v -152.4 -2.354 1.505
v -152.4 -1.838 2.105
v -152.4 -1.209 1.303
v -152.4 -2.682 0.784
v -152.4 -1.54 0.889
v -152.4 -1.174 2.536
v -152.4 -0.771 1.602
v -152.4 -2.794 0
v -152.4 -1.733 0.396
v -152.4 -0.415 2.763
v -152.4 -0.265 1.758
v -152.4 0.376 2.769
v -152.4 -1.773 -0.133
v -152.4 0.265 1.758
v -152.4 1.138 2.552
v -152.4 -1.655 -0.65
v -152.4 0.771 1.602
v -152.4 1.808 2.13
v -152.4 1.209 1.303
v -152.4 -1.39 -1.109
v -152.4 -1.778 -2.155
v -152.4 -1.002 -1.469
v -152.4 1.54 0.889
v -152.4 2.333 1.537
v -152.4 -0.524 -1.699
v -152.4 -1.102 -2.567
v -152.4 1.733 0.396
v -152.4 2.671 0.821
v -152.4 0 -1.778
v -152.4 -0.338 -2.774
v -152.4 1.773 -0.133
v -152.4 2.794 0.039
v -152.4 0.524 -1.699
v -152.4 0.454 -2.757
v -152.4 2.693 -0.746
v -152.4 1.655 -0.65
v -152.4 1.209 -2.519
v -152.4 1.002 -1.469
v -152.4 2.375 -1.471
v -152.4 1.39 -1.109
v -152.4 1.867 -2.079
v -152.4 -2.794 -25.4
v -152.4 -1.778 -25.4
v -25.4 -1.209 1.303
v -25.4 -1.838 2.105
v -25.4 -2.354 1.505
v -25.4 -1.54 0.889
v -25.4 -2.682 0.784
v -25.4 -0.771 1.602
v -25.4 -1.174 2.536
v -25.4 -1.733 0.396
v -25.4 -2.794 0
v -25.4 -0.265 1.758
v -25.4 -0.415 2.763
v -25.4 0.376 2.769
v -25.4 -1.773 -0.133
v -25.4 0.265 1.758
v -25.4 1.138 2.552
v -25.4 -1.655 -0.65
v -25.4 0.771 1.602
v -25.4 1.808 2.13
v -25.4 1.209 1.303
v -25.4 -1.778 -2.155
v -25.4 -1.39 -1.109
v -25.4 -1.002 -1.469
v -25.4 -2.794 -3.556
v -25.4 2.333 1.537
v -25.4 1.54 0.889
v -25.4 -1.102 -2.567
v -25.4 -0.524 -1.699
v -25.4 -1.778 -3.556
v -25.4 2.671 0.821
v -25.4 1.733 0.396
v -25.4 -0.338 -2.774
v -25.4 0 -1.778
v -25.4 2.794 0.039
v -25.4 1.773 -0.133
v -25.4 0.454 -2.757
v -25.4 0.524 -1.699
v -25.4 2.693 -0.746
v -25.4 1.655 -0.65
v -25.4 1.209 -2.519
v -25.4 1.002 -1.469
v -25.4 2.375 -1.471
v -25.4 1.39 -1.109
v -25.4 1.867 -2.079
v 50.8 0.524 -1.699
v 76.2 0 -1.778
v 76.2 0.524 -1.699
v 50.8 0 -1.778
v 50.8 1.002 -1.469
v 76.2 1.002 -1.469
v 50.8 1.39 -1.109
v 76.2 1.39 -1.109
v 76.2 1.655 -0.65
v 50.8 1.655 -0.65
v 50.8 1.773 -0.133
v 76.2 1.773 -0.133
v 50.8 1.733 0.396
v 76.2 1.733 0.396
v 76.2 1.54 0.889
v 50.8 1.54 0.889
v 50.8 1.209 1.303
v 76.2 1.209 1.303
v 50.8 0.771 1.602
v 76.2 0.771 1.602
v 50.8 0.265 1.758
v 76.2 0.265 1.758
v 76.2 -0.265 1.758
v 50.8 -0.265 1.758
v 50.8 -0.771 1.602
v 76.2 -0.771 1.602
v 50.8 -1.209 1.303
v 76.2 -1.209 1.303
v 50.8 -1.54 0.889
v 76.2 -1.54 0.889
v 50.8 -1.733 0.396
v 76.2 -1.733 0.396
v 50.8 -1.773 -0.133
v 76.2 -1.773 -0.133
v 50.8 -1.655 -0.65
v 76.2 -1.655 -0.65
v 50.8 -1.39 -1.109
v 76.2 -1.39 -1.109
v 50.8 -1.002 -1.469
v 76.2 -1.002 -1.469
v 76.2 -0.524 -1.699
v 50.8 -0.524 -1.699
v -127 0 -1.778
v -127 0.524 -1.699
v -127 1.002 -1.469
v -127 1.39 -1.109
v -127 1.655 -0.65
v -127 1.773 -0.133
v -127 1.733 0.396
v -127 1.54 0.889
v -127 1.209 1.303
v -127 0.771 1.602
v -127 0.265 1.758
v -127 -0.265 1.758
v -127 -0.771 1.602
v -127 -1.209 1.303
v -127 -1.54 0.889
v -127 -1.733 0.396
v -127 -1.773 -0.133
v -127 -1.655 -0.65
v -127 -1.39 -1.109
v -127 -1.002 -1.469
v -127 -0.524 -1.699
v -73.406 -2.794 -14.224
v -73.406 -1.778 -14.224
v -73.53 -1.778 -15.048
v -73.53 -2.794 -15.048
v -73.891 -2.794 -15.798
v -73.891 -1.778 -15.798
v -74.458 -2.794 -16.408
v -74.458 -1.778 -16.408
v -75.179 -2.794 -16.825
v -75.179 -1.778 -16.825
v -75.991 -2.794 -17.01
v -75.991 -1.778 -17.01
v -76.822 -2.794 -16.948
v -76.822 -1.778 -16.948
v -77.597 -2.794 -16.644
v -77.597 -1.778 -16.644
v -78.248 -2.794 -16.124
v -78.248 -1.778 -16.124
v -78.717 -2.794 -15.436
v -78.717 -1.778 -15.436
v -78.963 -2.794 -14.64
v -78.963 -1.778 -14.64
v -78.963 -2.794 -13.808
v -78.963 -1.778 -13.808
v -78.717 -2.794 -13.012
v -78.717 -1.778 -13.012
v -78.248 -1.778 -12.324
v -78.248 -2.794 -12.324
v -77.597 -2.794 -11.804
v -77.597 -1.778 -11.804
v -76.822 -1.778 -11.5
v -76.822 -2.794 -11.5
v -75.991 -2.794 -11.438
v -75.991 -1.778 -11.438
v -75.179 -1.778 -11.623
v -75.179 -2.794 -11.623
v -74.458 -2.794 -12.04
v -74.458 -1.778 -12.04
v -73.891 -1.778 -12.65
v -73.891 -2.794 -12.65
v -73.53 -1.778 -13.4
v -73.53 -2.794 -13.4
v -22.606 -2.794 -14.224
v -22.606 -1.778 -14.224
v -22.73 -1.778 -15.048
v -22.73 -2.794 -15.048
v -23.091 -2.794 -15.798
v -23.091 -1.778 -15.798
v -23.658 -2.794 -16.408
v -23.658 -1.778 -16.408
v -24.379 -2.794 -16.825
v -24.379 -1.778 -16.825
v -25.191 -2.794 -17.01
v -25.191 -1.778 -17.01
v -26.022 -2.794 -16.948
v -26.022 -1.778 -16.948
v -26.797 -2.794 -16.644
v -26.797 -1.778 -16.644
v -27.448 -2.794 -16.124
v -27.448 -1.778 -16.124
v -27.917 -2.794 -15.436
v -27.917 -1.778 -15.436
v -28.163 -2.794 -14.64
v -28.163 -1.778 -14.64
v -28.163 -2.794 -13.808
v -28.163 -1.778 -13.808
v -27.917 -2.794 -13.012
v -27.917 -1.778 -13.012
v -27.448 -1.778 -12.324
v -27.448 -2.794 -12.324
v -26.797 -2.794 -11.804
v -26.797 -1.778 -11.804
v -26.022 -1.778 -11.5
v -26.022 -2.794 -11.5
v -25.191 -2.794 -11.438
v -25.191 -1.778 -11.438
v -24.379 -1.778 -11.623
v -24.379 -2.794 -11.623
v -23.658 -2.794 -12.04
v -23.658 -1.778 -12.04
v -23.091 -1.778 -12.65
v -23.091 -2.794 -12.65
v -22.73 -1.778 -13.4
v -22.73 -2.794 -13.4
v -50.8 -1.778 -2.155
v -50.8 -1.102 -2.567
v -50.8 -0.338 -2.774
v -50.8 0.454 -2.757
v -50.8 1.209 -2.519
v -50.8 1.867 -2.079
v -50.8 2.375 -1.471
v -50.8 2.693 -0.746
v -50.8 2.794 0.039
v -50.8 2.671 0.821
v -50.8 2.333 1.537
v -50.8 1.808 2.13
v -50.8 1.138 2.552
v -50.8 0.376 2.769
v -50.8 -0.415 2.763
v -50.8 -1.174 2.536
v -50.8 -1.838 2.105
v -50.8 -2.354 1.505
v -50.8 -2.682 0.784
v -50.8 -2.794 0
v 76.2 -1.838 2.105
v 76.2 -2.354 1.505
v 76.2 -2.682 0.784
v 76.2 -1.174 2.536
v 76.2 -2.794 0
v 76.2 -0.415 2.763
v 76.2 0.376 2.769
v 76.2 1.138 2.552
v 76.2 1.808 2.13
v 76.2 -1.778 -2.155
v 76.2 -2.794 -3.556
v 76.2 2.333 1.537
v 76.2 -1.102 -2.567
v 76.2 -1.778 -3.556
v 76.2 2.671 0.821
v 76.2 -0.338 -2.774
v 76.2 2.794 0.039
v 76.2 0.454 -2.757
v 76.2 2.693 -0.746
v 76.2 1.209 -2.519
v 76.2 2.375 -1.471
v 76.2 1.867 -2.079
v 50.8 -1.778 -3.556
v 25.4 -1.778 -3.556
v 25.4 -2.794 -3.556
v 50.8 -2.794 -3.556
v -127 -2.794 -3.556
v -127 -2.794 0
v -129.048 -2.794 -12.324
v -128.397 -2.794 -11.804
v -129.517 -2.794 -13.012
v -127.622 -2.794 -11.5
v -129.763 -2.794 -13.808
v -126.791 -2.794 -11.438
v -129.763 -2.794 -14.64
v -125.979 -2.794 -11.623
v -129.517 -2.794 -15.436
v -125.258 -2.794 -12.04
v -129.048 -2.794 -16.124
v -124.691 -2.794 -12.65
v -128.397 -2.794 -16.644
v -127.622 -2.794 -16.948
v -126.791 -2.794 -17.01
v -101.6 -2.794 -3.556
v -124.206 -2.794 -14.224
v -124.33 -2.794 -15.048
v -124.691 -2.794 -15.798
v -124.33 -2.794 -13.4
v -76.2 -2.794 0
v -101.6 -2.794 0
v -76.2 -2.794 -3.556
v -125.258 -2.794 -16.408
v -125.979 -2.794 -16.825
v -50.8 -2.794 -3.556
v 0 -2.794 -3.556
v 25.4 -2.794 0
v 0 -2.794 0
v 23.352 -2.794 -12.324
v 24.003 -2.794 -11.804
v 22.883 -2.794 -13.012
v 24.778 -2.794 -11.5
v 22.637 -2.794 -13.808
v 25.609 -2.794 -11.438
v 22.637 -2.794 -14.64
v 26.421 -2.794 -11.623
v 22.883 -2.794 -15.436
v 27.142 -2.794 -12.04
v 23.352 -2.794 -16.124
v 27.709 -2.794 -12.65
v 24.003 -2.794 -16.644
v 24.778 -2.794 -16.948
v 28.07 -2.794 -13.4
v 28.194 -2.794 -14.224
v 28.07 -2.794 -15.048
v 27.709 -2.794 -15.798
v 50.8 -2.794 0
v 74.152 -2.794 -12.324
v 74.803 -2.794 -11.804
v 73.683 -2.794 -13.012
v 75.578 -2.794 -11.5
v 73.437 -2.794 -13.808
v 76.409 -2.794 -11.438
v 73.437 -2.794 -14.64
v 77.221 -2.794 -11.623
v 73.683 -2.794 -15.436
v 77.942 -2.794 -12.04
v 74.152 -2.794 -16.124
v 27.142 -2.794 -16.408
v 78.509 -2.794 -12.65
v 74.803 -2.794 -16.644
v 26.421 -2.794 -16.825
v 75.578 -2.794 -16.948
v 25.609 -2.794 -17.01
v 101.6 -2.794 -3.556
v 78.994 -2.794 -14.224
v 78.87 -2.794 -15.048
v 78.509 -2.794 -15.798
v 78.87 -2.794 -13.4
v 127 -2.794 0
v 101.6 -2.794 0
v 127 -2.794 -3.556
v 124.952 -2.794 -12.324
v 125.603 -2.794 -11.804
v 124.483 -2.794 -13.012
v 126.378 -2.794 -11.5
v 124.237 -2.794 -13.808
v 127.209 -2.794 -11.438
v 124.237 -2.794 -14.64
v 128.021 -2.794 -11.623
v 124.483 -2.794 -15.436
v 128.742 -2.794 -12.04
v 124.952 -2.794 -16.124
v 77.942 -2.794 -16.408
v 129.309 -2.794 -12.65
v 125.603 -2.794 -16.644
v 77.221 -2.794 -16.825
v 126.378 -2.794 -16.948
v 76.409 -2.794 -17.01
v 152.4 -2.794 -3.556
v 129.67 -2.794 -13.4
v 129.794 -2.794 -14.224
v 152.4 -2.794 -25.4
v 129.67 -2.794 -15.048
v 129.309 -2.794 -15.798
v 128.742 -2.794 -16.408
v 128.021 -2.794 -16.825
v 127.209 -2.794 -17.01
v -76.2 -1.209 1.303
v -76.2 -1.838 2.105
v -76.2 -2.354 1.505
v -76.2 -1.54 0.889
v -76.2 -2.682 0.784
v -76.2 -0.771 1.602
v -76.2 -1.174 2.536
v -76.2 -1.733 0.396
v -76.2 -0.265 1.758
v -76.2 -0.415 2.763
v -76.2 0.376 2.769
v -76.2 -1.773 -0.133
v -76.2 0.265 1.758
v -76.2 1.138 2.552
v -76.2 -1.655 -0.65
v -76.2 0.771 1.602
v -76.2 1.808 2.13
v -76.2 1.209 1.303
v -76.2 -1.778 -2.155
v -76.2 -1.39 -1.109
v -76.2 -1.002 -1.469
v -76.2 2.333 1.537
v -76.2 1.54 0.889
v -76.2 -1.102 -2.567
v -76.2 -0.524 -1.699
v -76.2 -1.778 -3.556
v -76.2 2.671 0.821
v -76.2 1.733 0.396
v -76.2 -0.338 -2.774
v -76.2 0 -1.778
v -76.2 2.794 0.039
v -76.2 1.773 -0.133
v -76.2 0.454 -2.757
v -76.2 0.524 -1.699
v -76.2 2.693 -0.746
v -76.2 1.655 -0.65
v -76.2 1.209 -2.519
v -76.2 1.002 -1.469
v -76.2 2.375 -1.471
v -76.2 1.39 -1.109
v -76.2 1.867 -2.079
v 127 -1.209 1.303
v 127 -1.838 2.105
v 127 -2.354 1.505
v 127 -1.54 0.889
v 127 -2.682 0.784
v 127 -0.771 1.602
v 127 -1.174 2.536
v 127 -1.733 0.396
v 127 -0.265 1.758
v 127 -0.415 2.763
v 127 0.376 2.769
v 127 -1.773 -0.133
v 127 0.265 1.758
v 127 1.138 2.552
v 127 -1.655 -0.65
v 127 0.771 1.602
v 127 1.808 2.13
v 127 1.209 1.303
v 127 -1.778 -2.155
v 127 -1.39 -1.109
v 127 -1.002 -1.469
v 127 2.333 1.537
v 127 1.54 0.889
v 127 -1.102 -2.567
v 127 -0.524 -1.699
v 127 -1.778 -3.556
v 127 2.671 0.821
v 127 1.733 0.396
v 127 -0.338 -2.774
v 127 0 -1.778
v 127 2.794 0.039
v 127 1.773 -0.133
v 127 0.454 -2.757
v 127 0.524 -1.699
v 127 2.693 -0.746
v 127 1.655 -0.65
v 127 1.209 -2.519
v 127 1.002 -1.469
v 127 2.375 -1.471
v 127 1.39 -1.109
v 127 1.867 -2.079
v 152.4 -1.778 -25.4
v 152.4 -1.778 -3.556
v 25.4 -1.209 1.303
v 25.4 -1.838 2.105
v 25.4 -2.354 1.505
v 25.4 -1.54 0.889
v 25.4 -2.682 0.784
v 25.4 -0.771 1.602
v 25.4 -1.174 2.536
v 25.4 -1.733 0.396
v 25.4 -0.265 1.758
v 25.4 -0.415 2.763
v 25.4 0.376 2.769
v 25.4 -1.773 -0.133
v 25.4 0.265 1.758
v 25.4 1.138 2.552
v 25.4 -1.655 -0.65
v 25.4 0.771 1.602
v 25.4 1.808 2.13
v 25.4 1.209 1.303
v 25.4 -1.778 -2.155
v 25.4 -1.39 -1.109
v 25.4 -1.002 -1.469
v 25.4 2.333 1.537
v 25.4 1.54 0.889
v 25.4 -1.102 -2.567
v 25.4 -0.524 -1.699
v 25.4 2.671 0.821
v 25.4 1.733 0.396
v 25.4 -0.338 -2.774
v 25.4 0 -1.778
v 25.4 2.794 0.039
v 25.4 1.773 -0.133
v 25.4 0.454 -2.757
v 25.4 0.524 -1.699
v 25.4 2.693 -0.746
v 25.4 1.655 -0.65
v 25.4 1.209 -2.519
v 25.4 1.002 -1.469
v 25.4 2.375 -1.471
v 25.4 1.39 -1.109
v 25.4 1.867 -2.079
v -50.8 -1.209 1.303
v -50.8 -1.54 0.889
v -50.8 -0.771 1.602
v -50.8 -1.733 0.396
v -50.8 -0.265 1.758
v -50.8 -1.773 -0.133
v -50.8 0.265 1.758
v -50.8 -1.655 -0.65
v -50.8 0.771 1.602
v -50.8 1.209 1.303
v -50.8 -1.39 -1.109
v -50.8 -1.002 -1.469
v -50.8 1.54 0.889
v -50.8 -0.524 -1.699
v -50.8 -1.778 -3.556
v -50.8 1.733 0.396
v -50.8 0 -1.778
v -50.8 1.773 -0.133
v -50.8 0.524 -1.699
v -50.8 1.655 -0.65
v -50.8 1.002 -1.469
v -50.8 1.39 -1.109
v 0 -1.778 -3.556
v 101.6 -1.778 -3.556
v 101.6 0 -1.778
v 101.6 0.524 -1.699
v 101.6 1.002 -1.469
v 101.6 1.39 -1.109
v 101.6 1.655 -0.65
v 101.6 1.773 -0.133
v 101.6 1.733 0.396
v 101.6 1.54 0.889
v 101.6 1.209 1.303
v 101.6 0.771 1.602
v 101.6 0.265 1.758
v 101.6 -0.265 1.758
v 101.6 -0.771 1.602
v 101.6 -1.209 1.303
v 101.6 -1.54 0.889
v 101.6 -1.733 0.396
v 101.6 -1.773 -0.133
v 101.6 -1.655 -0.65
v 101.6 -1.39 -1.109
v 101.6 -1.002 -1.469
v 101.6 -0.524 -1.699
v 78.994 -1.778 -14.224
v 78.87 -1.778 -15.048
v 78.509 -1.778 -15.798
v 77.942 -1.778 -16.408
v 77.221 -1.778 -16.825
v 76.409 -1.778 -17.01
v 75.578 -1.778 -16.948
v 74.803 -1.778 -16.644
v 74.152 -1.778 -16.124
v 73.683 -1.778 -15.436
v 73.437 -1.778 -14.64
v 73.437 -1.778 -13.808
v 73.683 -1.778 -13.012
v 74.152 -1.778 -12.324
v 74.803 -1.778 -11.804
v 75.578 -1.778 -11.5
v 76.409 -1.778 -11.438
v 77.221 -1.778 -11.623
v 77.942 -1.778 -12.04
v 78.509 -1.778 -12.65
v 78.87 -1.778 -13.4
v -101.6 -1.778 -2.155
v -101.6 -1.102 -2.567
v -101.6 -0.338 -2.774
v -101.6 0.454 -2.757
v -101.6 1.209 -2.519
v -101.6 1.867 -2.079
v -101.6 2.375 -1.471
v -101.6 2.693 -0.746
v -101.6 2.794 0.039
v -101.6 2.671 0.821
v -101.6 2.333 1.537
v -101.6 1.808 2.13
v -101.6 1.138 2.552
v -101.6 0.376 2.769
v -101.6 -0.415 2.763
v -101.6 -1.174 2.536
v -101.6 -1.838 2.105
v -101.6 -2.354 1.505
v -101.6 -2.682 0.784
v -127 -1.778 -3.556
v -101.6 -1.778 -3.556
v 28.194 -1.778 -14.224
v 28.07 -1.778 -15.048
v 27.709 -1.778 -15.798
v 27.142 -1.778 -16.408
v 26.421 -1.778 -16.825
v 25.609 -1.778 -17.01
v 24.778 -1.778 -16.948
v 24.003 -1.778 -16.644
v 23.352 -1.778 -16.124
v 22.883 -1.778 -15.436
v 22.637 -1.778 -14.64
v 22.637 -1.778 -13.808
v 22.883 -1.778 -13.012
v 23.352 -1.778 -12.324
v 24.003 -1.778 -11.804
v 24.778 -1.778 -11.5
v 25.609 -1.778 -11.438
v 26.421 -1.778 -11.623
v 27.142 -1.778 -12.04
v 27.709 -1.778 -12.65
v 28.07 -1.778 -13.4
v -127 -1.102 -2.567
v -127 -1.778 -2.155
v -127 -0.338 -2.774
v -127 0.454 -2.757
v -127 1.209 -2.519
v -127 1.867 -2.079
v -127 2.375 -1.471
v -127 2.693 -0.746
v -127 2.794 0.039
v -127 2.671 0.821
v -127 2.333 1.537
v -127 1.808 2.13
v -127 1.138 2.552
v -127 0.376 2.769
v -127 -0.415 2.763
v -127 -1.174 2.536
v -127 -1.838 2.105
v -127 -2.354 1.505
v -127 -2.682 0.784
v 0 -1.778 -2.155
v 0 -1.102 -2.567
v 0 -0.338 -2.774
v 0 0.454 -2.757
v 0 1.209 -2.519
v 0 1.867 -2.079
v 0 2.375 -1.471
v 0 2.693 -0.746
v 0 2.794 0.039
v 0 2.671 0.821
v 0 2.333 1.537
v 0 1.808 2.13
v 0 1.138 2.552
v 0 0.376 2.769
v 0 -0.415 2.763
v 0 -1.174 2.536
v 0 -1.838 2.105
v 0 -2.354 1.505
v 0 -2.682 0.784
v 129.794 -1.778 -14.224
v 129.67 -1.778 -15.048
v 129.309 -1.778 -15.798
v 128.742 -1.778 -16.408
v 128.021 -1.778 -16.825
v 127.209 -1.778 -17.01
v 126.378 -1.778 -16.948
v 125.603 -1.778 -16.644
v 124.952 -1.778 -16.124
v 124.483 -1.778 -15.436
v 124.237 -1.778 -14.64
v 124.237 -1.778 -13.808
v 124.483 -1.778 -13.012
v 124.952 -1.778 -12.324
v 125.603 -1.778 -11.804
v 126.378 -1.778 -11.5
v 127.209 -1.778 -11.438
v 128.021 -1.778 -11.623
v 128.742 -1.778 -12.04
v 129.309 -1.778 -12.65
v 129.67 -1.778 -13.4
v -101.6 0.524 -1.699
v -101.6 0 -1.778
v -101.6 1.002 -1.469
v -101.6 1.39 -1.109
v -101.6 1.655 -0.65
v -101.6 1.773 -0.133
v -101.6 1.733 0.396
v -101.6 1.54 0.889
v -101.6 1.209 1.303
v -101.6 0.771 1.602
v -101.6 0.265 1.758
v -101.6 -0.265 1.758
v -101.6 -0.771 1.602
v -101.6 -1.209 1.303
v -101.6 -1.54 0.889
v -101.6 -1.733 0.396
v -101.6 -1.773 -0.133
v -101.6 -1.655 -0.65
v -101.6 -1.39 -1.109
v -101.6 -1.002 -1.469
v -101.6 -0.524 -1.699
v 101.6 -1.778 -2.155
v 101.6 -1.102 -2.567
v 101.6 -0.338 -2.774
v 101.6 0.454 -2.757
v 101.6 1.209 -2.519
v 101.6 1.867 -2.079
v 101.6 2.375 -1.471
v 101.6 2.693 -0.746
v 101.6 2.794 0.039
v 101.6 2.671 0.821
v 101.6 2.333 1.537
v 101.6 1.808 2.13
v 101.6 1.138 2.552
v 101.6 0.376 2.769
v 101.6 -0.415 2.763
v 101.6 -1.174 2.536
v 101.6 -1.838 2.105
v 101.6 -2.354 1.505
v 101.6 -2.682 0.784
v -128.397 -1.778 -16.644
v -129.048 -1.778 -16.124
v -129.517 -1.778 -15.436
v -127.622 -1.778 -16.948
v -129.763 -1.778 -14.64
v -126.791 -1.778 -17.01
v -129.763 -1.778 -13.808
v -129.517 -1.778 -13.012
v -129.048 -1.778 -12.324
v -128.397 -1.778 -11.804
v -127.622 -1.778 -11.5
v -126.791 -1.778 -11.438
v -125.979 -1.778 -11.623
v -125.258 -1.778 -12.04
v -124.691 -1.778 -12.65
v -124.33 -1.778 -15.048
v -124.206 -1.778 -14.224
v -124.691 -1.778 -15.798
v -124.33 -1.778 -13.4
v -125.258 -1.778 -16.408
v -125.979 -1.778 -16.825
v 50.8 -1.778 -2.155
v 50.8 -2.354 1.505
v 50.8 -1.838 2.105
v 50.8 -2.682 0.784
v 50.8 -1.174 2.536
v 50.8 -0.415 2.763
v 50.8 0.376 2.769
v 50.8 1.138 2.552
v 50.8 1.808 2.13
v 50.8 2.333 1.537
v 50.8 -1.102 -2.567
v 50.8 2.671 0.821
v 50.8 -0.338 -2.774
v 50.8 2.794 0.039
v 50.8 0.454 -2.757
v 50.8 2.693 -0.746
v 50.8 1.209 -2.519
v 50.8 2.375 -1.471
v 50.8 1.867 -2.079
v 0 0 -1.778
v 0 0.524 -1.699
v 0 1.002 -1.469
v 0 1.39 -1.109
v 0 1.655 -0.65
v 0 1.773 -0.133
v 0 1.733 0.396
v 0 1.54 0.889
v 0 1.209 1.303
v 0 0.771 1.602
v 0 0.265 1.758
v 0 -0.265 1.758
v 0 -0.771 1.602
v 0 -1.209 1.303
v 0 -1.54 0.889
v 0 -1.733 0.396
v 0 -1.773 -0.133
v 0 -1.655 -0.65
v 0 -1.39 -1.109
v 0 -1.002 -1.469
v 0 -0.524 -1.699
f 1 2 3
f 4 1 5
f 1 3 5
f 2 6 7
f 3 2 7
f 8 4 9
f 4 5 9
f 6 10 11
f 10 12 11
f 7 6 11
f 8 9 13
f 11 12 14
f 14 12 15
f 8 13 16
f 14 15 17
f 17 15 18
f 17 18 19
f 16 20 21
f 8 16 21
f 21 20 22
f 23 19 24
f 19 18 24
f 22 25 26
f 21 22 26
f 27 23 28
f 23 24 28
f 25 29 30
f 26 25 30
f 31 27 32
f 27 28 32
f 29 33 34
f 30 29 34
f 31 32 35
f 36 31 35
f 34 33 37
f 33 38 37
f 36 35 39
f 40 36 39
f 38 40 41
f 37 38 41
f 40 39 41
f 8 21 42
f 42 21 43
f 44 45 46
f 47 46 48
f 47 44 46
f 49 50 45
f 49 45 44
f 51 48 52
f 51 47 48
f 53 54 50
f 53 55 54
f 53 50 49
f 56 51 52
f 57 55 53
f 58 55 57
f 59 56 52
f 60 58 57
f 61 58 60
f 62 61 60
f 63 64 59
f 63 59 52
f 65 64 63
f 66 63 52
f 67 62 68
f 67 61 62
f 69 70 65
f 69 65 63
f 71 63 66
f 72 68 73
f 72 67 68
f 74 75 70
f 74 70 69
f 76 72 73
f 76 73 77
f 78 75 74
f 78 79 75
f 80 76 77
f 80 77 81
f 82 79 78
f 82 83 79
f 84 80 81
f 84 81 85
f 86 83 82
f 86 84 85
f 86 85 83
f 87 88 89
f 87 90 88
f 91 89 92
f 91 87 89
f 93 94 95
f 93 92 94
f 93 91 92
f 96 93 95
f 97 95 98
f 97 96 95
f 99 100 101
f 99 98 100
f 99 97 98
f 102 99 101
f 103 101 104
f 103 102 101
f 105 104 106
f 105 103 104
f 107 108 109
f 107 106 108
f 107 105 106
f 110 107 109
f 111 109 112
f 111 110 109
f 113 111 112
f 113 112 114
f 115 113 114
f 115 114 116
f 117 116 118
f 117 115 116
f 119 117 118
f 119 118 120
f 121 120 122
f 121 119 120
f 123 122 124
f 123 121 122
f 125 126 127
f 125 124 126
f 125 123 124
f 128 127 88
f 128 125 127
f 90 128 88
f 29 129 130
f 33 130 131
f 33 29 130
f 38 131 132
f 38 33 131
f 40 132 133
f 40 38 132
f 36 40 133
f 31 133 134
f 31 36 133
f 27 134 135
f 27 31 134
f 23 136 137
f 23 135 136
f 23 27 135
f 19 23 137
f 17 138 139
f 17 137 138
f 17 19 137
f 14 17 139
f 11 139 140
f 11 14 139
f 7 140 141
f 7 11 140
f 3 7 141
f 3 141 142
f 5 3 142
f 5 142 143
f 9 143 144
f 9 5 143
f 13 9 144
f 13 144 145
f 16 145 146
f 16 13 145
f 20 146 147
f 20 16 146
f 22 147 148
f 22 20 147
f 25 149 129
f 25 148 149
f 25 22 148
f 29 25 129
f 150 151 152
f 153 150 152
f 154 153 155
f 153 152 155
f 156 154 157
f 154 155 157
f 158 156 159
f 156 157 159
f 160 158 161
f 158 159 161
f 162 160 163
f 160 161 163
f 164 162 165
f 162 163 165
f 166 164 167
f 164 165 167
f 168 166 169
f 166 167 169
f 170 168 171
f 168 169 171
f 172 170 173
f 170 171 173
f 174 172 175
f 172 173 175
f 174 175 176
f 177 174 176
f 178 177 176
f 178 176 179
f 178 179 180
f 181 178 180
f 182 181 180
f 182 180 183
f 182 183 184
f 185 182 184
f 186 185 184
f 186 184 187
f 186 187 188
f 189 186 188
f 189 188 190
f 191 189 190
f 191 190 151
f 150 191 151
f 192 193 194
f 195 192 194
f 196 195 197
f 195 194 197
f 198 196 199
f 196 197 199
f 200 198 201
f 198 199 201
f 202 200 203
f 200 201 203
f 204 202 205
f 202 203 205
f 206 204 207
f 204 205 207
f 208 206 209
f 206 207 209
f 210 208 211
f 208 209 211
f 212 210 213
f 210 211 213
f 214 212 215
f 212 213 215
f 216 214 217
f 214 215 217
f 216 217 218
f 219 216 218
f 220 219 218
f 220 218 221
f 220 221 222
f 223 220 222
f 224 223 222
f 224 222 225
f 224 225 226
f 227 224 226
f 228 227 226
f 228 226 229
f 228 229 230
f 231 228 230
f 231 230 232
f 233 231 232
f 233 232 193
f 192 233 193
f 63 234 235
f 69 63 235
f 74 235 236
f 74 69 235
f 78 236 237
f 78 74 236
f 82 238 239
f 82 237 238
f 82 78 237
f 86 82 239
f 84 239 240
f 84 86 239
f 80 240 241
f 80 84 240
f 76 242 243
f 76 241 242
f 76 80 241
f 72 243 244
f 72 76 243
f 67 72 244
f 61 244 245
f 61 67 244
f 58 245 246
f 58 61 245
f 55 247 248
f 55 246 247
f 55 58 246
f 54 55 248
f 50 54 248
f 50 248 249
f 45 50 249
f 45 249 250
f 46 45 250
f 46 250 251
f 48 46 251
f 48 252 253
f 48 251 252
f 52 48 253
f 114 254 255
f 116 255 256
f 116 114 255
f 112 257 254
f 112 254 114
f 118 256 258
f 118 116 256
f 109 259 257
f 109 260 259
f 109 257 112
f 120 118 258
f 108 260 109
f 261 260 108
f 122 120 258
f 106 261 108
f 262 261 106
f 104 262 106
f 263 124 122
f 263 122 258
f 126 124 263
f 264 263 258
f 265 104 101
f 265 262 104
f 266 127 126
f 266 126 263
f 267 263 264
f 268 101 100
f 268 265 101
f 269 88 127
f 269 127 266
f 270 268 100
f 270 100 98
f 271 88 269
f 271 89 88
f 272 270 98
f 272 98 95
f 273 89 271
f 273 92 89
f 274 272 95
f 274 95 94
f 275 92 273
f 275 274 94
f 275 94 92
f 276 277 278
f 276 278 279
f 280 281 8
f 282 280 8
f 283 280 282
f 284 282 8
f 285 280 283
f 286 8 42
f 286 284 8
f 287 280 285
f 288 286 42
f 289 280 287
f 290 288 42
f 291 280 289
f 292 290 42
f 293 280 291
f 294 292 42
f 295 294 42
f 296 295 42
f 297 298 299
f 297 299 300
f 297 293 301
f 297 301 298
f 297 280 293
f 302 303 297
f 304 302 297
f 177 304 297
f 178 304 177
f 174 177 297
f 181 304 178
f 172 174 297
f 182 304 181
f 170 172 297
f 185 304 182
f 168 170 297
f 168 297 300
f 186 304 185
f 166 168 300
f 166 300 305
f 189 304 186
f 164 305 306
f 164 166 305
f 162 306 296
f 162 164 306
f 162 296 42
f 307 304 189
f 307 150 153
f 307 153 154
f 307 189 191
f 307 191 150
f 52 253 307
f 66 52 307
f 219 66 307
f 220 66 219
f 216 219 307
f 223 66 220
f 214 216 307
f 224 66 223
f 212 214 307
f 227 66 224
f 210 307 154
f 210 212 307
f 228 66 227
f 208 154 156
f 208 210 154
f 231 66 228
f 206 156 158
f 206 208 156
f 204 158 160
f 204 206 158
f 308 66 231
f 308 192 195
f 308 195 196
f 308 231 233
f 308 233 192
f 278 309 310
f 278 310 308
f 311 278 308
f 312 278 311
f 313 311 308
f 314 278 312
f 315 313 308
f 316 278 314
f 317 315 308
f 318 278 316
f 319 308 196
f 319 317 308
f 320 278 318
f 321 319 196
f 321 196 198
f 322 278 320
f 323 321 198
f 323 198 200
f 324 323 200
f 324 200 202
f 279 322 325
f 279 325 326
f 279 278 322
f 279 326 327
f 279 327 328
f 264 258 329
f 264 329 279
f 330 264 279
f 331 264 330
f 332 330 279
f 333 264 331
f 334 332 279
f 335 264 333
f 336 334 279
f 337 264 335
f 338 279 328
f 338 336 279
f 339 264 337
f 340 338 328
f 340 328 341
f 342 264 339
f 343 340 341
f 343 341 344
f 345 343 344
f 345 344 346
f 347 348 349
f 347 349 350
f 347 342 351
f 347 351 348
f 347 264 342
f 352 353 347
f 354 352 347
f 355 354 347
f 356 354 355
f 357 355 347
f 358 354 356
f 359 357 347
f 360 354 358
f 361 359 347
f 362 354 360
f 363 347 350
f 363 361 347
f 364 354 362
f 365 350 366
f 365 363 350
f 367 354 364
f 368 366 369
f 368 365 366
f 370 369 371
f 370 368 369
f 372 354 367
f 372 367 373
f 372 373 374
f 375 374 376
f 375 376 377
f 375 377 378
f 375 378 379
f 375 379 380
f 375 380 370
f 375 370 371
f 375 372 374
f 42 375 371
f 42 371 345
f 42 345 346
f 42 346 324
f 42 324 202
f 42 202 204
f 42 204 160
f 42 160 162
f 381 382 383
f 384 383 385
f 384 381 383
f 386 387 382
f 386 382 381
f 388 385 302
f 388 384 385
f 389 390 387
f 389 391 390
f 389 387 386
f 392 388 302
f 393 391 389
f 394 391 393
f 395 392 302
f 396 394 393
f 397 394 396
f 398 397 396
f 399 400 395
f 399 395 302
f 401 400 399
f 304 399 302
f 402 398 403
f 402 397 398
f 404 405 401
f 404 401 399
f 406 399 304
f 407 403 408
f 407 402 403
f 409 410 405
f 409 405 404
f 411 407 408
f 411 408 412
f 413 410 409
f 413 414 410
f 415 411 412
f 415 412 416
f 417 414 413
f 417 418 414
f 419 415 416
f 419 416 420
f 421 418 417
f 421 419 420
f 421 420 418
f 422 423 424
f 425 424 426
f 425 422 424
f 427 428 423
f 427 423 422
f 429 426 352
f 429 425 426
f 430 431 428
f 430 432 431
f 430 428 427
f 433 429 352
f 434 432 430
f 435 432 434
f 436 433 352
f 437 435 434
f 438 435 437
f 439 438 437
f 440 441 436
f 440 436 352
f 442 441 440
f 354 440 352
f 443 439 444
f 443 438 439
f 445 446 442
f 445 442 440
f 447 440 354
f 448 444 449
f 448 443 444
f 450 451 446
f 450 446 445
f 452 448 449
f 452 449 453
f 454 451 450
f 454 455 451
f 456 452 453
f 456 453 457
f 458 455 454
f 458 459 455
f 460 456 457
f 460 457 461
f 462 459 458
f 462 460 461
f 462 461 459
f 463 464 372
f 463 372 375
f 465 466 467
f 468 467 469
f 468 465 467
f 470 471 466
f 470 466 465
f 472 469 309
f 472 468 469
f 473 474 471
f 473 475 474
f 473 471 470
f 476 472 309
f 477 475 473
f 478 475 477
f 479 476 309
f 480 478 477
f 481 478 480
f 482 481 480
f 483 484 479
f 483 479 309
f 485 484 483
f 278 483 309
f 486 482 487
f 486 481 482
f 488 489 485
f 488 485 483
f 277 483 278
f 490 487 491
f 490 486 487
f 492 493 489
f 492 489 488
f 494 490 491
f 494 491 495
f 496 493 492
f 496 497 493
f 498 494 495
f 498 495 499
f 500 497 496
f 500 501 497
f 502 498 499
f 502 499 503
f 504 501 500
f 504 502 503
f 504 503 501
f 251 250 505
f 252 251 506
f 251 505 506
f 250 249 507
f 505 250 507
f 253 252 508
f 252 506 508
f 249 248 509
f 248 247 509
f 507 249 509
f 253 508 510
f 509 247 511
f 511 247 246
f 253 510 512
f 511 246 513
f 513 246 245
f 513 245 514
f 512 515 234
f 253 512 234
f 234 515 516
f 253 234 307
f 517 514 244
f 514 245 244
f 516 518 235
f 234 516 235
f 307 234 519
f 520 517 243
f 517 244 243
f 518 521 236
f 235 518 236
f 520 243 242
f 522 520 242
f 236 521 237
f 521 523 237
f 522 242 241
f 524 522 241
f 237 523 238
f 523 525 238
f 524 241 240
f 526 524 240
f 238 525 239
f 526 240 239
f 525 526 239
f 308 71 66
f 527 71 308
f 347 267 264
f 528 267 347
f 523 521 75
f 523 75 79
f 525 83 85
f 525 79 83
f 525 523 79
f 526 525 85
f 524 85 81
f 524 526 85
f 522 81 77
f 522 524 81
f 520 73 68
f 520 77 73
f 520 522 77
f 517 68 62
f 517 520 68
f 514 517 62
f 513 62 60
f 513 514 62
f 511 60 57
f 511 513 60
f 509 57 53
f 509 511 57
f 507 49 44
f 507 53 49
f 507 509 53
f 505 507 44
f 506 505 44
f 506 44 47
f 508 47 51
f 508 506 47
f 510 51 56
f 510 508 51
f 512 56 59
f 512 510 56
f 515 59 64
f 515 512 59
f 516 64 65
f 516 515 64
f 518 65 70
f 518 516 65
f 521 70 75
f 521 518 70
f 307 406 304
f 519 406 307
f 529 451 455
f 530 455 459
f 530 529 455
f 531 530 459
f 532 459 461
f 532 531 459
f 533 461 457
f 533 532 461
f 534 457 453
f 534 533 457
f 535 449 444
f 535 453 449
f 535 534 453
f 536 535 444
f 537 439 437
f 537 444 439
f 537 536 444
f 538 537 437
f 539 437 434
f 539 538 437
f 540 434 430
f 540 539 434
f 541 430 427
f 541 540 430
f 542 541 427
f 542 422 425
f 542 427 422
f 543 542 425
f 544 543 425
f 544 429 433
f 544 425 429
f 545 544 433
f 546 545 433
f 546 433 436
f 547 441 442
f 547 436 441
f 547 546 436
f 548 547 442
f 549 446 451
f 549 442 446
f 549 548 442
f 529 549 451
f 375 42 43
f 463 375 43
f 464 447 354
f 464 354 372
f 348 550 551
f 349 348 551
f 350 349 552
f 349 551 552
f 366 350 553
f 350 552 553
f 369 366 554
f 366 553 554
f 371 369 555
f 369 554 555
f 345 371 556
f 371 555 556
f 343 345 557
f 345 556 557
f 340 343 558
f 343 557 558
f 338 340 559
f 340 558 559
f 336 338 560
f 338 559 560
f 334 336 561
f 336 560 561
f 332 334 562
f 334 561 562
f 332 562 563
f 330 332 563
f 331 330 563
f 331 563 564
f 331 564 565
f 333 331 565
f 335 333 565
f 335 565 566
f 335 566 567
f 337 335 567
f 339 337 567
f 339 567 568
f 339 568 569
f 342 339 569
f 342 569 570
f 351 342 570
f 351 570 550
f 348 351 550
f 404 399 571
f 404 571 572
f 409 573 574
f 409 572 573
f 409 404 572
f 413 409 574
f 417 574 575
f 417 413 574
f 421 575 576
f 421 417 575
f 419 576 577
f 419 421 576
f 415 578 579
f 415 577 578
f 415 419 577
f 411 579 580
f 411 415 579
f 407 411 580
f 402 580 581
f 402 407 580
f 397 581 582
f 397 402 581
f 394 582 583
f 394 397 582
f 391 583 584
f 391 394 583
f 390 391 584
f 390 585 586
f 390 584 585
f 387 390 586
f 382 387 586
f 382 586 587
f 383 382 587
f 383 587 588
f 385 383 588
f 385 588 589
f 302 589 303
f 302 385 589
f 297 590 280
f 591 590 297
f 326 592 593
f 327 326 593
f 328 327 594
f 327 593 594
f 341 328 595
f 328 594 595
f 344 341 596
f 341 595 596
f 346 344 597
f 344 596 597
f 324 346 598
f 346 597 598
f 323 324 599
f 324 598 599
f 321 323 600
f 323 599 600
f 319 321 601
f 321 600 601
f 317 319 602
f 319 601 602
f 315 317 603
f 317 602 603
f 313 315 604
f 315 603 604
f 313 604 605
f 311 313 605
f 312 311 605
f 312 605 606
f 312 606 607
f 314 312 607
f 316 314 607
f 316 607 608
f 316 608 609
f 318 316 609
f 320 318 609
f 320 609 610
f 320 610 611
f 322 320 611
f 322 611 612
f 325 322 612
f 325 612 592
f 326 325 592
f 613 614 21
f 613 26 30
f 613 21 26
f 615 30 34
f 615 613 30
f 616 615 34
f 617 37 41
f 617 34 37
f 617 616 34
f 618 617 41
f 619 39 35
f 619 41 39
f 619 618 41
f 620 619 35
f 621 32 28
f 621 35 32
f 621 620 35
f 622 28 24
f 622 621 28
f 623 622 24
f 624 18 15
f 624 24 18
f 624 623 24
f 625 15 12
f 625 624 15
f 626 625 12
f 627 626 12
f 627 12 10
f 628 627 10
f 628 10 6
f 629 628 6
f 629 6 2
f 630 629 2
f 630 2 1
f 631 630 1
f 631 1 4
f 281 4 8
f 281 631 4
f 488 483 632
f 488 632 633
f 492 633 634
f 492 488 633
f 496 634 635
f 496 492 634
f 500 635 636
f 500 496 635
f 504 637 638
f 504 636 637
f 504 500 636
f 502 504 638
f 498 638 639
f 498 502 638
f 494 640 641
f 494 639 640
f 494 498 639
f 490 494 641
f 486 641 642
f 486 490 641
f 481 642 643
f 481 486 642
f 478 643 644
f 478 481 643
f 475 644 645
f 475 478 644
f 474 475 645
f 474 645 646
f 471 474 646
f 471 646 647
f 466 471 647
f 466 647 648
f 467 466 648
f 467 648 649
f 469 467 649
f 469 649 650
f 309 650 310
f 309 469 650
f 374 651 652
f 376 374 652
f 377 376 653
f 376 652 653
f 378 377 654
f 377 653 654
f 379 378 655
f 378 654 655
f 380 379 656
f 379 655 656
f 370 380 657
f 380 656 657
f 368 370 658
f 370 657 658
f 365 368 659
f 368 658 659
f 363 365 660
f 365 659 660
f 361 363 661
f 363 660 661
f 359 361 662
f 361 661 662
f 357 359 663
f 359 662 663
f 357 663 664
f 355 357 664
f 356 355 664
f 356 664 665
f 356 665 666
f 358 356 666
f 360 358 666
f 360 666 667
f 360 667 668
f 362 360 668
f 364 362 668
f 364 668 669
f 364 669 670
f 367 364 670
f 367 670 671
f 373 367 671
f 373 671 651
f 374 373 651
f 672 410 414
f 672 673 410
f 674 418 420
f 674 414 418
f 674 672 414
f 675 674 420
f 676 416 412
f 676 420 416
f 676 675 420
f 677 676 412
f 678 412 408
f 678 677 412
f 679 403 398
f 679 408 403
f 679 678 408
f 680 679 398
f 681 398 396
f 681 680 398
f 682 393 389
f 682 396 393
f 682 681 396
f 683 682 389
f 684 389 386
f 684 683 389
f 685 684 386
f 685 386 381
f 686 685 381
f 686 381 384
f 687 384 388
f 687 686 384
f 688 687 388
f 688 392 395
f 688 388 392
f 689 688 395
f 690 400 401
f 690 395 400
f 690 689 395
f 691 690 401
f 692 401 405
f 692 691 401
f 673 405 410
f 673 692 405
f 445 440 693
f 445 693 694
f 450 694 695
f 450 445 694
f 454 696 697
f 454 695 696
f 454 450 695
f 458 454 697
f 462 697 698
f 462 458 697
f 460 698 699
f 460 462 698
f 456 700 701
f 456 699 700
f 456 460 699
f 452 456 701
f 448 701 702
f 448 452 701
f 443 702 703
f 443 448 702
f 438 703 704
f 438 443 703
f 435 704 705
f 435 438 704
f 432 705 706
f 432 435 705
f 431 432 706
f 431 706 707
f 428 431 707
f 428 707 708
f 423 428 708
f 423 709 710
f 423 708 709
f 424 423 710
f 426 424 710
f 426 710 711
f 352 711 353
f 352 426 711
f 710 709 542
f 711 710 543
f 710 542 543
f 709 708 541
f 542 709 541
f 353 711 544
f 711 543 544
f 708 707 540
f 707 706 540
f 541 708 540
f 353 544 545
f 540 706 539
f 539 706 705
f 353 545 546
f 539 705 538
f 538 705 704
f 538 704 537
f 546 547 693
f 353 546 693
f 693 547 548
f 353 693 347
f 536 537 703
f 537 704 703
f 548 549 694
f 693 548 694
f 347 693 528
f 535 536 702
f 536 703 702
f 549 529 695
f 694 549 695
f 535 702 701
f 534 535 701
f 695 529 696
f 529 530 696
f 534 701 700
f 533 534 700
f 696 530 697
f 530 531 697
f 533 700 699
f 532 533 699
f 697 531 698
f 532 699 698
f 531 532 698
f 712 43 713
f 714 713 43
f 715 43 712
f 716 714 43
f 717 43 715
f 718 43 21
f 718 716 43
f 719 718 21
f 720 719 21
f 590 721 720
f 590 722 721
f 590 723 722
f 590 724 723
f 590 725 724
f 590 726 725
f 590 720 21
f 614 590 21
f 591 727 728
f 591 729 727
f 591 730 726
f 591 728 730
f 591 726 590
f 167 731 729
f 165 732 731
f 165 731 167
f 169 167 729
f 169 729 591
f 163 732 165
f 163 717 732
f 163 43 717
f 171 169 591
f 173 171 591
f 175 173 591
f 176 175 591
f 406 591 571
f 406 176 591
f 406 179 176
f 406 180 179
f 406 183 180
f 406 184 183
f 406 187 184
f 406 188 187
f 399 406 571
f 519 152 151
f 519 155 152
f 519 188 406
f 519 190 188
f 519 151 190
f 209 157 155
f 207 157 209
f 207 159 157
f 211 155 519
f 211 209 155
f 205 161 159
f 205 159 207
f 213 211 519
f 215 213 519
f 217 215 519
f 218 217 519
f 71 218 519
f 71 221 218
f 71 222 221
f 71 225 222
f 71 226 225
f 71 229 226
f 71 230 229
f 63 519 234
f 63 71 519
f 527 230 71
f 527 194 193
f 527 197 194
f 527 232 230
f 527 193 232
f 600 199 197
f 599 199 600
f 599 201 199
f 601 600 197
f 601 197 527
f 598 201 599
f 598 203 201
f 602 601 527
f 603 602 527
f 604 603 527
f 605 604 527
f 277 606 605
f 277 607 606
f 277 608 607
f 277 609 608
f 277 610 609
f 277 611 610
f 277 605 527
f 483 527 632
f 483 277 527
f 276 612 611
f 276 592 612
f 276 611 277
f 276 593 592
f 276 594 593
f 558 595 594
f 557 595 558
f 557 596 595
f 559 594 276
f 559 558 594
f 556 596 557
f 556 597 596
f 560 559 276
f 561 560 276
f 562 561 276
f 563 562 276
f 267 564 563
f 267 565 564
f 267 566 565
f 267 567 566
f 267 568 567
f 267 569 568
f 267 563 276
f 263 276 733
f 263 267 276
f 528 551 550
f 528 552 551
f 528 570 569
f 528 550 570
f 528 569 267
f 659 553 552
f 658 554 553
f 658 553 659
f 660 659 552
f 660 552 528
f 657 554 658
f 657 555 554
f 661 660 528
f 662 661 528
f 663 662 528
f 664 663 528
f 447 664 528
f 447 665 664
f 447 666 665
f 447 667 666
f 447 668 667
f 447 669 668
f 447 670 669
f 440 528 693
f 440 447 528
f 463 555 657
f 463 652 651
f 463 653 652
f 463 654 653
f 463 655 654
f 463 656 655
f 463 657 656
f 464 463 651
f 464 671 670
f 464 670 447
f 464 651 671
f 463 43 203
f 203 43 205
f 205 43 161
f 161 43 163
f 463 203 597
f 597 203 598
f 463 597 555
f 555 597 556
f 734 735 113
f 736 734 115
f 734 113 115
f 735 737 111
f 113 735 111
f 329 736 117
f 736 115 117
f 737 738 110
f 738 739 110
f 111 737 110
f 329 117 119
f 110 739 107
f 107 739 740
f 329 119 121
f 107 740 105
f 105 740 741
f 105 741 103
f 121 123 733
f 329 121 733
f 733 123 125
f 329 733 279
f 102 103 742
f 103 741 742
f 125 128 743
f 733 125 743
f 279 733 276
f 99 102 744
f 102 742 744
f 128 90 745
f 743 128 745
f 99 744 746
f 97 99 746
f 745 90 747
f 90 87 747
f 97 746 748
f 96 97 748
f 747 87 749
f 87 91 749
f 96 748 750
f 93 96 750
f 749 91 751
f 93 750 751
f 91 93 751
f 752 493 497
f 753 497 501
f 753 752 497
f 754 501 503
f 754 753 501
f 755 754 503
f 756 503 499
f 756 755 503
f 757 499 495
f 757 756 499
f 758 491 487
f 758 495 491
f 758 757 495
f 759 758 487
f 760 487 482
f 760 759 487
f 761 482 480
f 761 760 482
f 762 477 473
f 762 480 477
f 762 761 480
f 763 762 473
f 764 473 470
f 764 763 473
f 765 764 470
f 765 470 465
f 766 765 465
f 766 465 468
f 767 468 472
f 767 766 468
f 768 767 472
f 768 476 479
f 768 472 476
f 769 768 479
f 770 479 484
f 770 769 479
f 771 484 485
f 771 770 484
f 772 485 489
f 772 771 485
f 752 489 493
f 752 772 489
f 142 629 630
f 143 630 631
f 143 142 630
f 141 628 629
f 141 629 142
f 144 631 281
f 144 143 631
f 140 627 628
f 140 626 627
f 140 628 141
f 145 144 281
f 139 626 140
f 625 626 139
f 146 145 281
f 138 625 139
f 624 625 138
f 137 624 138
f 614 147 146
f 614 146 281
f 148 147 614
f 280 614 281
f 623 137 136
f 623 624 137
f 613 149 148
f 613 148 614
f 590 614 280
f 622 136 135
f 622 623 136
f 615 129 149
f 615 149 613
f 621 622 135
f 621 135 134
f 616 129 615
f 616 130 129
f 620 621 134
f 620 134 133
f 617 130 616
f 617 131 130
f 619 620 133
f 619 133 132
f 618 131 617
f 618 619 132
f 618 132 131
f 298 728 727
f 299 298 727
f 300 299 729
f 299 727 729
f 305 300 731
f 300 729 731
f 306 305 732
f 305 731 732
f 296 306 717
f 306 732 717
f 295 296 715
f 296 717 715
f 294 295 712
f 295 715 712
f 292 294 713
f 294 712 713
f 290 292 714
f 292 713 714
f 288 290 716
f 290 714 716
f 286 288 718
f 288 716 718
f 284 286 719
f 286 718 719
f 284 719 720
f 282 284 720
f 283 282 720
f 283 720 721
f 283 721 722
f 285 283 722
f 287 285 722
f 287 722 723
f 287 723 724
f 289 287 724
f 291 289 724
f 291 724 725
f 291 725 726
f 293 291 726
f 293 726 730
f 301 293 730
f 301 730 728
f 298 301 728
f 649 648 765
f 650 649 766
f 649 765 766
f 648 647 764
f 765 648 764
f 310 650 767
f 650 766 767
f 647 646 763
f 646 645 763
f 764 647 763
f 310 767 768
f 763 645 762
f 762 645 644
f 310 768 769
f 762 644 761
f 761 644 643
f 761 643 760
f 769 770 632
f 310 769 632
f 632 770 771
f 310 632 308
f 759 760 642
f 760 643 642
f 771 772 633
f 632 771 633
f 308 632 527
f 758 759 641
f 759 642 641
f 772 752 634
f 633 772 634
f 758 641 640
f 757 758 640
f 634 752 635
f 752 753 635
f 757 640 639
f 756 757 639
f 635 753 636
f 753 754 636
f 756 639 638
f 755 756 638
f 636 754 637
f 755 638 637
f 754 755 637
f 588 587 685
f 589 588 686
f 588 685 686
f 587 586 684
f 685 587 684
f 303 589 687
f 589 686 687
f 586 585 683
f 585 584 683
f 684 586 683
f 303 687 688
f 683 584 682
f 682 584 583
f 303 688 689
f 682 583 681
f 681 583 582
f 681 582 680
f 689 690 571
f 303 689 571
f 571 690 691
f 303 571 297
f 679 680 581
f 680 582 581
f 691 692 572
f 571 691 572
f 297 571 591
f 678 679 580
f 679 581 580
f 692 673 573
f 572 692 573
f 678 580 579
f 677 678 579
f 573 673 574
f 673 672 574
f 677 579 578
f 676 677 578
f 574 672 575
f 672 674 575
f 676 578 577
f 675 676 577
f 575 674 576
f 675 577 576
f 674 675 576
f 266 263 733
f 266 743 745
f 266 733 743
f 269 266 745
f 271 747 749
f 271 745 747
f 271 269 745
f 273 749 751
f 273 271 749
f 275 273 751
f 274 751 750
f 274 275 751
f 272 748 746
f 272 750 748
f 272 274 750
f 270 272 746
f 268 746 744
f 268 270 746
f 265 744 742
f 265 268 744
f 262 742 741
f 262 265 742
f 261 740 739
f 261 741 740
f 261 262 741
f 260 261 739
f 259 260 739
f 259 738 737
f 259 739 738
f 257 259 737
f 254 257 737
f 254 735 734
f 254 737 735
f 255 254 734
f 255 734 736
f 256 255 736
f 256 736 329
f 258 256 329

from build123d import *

# Parameters (mm, degrees)
SKETCH1_R           = 1.778
BOSS_EXTRUDE1_DEPTH = 152.4
SKETCH2_R           = 2.794
SKETCH2_W           = 25.4
SKETCH2_H           = 6.35
CUT_EXTRUDE1_DEPTH  = 914.4
LPATTERN1_COUNT     = 4
LPATTERN1_PITCH     = 50.8
LPATTERN2_COUNT     = 4
LPATTERN2_PITCH     = 50.8


with BuildPart() as part:
    # Sketch1 → Boss-Extrude1 (new body, symmetric)
    with BuildSketch(Plane(origin=(0, 0, 0), x_dir=(0, 0, -1), z_dir=(1, 0, 0))):
        with BuildLine():
            Line((0, -2.794), (25.4, -2.794))
            Line((25.4, -2.794), (25.4, -1.778))
            Line((25.4, -1.778), (2.155261469, -1.778))
            ThreePointArc((2.155261469, -1.778), (-1.191365603, 2.52726809), (0, -2.794))
        make_face()
        Circle(SKETCH1_R, mode=Mode.SUBTRACT)
    extrude(amount=BOSS_EXTRUDE1_DEPTH, both=True)

    # Sketch2 → Cut-Extrude1 (cut, symmetric)
    with BuildSketch(Plane(origin=(0, -1.778, 0), x_dir=(1, 0, 0), z_dir=(0, 1, 0))):
        with Locations((-25.4, 14.224)):
            Circle(SKETCH2_R)
        with Locations((-12.7, 0.381)):
            Rectangle(SKETCH2_W, SKETCH2_H)
    cut_extrude1 = extrude(amount=CUT_EXTRUDE1_DEPTH, both=True, mode=Mode.SUBTRACT)

    # LPattern1: Cut-Extrude1 ×4
    with Locations(*[(-i * LPATTERN1_PITCH, 0, 0) for i in range(1, LPATTERN1_COUNT)]):
        add(cut_extrude1, mode=Mode.SUBTRACT)

    # LPattern2: Cut-Extrude1 ×4
    with Locations(*[(i * LPATTERN2_PITCH, 0, 0) for i in range(1, LPATTERN2_COUNT)]):
        add(cut_extrude1, mode=Mode.SUBTRACT)


solid = part.part
